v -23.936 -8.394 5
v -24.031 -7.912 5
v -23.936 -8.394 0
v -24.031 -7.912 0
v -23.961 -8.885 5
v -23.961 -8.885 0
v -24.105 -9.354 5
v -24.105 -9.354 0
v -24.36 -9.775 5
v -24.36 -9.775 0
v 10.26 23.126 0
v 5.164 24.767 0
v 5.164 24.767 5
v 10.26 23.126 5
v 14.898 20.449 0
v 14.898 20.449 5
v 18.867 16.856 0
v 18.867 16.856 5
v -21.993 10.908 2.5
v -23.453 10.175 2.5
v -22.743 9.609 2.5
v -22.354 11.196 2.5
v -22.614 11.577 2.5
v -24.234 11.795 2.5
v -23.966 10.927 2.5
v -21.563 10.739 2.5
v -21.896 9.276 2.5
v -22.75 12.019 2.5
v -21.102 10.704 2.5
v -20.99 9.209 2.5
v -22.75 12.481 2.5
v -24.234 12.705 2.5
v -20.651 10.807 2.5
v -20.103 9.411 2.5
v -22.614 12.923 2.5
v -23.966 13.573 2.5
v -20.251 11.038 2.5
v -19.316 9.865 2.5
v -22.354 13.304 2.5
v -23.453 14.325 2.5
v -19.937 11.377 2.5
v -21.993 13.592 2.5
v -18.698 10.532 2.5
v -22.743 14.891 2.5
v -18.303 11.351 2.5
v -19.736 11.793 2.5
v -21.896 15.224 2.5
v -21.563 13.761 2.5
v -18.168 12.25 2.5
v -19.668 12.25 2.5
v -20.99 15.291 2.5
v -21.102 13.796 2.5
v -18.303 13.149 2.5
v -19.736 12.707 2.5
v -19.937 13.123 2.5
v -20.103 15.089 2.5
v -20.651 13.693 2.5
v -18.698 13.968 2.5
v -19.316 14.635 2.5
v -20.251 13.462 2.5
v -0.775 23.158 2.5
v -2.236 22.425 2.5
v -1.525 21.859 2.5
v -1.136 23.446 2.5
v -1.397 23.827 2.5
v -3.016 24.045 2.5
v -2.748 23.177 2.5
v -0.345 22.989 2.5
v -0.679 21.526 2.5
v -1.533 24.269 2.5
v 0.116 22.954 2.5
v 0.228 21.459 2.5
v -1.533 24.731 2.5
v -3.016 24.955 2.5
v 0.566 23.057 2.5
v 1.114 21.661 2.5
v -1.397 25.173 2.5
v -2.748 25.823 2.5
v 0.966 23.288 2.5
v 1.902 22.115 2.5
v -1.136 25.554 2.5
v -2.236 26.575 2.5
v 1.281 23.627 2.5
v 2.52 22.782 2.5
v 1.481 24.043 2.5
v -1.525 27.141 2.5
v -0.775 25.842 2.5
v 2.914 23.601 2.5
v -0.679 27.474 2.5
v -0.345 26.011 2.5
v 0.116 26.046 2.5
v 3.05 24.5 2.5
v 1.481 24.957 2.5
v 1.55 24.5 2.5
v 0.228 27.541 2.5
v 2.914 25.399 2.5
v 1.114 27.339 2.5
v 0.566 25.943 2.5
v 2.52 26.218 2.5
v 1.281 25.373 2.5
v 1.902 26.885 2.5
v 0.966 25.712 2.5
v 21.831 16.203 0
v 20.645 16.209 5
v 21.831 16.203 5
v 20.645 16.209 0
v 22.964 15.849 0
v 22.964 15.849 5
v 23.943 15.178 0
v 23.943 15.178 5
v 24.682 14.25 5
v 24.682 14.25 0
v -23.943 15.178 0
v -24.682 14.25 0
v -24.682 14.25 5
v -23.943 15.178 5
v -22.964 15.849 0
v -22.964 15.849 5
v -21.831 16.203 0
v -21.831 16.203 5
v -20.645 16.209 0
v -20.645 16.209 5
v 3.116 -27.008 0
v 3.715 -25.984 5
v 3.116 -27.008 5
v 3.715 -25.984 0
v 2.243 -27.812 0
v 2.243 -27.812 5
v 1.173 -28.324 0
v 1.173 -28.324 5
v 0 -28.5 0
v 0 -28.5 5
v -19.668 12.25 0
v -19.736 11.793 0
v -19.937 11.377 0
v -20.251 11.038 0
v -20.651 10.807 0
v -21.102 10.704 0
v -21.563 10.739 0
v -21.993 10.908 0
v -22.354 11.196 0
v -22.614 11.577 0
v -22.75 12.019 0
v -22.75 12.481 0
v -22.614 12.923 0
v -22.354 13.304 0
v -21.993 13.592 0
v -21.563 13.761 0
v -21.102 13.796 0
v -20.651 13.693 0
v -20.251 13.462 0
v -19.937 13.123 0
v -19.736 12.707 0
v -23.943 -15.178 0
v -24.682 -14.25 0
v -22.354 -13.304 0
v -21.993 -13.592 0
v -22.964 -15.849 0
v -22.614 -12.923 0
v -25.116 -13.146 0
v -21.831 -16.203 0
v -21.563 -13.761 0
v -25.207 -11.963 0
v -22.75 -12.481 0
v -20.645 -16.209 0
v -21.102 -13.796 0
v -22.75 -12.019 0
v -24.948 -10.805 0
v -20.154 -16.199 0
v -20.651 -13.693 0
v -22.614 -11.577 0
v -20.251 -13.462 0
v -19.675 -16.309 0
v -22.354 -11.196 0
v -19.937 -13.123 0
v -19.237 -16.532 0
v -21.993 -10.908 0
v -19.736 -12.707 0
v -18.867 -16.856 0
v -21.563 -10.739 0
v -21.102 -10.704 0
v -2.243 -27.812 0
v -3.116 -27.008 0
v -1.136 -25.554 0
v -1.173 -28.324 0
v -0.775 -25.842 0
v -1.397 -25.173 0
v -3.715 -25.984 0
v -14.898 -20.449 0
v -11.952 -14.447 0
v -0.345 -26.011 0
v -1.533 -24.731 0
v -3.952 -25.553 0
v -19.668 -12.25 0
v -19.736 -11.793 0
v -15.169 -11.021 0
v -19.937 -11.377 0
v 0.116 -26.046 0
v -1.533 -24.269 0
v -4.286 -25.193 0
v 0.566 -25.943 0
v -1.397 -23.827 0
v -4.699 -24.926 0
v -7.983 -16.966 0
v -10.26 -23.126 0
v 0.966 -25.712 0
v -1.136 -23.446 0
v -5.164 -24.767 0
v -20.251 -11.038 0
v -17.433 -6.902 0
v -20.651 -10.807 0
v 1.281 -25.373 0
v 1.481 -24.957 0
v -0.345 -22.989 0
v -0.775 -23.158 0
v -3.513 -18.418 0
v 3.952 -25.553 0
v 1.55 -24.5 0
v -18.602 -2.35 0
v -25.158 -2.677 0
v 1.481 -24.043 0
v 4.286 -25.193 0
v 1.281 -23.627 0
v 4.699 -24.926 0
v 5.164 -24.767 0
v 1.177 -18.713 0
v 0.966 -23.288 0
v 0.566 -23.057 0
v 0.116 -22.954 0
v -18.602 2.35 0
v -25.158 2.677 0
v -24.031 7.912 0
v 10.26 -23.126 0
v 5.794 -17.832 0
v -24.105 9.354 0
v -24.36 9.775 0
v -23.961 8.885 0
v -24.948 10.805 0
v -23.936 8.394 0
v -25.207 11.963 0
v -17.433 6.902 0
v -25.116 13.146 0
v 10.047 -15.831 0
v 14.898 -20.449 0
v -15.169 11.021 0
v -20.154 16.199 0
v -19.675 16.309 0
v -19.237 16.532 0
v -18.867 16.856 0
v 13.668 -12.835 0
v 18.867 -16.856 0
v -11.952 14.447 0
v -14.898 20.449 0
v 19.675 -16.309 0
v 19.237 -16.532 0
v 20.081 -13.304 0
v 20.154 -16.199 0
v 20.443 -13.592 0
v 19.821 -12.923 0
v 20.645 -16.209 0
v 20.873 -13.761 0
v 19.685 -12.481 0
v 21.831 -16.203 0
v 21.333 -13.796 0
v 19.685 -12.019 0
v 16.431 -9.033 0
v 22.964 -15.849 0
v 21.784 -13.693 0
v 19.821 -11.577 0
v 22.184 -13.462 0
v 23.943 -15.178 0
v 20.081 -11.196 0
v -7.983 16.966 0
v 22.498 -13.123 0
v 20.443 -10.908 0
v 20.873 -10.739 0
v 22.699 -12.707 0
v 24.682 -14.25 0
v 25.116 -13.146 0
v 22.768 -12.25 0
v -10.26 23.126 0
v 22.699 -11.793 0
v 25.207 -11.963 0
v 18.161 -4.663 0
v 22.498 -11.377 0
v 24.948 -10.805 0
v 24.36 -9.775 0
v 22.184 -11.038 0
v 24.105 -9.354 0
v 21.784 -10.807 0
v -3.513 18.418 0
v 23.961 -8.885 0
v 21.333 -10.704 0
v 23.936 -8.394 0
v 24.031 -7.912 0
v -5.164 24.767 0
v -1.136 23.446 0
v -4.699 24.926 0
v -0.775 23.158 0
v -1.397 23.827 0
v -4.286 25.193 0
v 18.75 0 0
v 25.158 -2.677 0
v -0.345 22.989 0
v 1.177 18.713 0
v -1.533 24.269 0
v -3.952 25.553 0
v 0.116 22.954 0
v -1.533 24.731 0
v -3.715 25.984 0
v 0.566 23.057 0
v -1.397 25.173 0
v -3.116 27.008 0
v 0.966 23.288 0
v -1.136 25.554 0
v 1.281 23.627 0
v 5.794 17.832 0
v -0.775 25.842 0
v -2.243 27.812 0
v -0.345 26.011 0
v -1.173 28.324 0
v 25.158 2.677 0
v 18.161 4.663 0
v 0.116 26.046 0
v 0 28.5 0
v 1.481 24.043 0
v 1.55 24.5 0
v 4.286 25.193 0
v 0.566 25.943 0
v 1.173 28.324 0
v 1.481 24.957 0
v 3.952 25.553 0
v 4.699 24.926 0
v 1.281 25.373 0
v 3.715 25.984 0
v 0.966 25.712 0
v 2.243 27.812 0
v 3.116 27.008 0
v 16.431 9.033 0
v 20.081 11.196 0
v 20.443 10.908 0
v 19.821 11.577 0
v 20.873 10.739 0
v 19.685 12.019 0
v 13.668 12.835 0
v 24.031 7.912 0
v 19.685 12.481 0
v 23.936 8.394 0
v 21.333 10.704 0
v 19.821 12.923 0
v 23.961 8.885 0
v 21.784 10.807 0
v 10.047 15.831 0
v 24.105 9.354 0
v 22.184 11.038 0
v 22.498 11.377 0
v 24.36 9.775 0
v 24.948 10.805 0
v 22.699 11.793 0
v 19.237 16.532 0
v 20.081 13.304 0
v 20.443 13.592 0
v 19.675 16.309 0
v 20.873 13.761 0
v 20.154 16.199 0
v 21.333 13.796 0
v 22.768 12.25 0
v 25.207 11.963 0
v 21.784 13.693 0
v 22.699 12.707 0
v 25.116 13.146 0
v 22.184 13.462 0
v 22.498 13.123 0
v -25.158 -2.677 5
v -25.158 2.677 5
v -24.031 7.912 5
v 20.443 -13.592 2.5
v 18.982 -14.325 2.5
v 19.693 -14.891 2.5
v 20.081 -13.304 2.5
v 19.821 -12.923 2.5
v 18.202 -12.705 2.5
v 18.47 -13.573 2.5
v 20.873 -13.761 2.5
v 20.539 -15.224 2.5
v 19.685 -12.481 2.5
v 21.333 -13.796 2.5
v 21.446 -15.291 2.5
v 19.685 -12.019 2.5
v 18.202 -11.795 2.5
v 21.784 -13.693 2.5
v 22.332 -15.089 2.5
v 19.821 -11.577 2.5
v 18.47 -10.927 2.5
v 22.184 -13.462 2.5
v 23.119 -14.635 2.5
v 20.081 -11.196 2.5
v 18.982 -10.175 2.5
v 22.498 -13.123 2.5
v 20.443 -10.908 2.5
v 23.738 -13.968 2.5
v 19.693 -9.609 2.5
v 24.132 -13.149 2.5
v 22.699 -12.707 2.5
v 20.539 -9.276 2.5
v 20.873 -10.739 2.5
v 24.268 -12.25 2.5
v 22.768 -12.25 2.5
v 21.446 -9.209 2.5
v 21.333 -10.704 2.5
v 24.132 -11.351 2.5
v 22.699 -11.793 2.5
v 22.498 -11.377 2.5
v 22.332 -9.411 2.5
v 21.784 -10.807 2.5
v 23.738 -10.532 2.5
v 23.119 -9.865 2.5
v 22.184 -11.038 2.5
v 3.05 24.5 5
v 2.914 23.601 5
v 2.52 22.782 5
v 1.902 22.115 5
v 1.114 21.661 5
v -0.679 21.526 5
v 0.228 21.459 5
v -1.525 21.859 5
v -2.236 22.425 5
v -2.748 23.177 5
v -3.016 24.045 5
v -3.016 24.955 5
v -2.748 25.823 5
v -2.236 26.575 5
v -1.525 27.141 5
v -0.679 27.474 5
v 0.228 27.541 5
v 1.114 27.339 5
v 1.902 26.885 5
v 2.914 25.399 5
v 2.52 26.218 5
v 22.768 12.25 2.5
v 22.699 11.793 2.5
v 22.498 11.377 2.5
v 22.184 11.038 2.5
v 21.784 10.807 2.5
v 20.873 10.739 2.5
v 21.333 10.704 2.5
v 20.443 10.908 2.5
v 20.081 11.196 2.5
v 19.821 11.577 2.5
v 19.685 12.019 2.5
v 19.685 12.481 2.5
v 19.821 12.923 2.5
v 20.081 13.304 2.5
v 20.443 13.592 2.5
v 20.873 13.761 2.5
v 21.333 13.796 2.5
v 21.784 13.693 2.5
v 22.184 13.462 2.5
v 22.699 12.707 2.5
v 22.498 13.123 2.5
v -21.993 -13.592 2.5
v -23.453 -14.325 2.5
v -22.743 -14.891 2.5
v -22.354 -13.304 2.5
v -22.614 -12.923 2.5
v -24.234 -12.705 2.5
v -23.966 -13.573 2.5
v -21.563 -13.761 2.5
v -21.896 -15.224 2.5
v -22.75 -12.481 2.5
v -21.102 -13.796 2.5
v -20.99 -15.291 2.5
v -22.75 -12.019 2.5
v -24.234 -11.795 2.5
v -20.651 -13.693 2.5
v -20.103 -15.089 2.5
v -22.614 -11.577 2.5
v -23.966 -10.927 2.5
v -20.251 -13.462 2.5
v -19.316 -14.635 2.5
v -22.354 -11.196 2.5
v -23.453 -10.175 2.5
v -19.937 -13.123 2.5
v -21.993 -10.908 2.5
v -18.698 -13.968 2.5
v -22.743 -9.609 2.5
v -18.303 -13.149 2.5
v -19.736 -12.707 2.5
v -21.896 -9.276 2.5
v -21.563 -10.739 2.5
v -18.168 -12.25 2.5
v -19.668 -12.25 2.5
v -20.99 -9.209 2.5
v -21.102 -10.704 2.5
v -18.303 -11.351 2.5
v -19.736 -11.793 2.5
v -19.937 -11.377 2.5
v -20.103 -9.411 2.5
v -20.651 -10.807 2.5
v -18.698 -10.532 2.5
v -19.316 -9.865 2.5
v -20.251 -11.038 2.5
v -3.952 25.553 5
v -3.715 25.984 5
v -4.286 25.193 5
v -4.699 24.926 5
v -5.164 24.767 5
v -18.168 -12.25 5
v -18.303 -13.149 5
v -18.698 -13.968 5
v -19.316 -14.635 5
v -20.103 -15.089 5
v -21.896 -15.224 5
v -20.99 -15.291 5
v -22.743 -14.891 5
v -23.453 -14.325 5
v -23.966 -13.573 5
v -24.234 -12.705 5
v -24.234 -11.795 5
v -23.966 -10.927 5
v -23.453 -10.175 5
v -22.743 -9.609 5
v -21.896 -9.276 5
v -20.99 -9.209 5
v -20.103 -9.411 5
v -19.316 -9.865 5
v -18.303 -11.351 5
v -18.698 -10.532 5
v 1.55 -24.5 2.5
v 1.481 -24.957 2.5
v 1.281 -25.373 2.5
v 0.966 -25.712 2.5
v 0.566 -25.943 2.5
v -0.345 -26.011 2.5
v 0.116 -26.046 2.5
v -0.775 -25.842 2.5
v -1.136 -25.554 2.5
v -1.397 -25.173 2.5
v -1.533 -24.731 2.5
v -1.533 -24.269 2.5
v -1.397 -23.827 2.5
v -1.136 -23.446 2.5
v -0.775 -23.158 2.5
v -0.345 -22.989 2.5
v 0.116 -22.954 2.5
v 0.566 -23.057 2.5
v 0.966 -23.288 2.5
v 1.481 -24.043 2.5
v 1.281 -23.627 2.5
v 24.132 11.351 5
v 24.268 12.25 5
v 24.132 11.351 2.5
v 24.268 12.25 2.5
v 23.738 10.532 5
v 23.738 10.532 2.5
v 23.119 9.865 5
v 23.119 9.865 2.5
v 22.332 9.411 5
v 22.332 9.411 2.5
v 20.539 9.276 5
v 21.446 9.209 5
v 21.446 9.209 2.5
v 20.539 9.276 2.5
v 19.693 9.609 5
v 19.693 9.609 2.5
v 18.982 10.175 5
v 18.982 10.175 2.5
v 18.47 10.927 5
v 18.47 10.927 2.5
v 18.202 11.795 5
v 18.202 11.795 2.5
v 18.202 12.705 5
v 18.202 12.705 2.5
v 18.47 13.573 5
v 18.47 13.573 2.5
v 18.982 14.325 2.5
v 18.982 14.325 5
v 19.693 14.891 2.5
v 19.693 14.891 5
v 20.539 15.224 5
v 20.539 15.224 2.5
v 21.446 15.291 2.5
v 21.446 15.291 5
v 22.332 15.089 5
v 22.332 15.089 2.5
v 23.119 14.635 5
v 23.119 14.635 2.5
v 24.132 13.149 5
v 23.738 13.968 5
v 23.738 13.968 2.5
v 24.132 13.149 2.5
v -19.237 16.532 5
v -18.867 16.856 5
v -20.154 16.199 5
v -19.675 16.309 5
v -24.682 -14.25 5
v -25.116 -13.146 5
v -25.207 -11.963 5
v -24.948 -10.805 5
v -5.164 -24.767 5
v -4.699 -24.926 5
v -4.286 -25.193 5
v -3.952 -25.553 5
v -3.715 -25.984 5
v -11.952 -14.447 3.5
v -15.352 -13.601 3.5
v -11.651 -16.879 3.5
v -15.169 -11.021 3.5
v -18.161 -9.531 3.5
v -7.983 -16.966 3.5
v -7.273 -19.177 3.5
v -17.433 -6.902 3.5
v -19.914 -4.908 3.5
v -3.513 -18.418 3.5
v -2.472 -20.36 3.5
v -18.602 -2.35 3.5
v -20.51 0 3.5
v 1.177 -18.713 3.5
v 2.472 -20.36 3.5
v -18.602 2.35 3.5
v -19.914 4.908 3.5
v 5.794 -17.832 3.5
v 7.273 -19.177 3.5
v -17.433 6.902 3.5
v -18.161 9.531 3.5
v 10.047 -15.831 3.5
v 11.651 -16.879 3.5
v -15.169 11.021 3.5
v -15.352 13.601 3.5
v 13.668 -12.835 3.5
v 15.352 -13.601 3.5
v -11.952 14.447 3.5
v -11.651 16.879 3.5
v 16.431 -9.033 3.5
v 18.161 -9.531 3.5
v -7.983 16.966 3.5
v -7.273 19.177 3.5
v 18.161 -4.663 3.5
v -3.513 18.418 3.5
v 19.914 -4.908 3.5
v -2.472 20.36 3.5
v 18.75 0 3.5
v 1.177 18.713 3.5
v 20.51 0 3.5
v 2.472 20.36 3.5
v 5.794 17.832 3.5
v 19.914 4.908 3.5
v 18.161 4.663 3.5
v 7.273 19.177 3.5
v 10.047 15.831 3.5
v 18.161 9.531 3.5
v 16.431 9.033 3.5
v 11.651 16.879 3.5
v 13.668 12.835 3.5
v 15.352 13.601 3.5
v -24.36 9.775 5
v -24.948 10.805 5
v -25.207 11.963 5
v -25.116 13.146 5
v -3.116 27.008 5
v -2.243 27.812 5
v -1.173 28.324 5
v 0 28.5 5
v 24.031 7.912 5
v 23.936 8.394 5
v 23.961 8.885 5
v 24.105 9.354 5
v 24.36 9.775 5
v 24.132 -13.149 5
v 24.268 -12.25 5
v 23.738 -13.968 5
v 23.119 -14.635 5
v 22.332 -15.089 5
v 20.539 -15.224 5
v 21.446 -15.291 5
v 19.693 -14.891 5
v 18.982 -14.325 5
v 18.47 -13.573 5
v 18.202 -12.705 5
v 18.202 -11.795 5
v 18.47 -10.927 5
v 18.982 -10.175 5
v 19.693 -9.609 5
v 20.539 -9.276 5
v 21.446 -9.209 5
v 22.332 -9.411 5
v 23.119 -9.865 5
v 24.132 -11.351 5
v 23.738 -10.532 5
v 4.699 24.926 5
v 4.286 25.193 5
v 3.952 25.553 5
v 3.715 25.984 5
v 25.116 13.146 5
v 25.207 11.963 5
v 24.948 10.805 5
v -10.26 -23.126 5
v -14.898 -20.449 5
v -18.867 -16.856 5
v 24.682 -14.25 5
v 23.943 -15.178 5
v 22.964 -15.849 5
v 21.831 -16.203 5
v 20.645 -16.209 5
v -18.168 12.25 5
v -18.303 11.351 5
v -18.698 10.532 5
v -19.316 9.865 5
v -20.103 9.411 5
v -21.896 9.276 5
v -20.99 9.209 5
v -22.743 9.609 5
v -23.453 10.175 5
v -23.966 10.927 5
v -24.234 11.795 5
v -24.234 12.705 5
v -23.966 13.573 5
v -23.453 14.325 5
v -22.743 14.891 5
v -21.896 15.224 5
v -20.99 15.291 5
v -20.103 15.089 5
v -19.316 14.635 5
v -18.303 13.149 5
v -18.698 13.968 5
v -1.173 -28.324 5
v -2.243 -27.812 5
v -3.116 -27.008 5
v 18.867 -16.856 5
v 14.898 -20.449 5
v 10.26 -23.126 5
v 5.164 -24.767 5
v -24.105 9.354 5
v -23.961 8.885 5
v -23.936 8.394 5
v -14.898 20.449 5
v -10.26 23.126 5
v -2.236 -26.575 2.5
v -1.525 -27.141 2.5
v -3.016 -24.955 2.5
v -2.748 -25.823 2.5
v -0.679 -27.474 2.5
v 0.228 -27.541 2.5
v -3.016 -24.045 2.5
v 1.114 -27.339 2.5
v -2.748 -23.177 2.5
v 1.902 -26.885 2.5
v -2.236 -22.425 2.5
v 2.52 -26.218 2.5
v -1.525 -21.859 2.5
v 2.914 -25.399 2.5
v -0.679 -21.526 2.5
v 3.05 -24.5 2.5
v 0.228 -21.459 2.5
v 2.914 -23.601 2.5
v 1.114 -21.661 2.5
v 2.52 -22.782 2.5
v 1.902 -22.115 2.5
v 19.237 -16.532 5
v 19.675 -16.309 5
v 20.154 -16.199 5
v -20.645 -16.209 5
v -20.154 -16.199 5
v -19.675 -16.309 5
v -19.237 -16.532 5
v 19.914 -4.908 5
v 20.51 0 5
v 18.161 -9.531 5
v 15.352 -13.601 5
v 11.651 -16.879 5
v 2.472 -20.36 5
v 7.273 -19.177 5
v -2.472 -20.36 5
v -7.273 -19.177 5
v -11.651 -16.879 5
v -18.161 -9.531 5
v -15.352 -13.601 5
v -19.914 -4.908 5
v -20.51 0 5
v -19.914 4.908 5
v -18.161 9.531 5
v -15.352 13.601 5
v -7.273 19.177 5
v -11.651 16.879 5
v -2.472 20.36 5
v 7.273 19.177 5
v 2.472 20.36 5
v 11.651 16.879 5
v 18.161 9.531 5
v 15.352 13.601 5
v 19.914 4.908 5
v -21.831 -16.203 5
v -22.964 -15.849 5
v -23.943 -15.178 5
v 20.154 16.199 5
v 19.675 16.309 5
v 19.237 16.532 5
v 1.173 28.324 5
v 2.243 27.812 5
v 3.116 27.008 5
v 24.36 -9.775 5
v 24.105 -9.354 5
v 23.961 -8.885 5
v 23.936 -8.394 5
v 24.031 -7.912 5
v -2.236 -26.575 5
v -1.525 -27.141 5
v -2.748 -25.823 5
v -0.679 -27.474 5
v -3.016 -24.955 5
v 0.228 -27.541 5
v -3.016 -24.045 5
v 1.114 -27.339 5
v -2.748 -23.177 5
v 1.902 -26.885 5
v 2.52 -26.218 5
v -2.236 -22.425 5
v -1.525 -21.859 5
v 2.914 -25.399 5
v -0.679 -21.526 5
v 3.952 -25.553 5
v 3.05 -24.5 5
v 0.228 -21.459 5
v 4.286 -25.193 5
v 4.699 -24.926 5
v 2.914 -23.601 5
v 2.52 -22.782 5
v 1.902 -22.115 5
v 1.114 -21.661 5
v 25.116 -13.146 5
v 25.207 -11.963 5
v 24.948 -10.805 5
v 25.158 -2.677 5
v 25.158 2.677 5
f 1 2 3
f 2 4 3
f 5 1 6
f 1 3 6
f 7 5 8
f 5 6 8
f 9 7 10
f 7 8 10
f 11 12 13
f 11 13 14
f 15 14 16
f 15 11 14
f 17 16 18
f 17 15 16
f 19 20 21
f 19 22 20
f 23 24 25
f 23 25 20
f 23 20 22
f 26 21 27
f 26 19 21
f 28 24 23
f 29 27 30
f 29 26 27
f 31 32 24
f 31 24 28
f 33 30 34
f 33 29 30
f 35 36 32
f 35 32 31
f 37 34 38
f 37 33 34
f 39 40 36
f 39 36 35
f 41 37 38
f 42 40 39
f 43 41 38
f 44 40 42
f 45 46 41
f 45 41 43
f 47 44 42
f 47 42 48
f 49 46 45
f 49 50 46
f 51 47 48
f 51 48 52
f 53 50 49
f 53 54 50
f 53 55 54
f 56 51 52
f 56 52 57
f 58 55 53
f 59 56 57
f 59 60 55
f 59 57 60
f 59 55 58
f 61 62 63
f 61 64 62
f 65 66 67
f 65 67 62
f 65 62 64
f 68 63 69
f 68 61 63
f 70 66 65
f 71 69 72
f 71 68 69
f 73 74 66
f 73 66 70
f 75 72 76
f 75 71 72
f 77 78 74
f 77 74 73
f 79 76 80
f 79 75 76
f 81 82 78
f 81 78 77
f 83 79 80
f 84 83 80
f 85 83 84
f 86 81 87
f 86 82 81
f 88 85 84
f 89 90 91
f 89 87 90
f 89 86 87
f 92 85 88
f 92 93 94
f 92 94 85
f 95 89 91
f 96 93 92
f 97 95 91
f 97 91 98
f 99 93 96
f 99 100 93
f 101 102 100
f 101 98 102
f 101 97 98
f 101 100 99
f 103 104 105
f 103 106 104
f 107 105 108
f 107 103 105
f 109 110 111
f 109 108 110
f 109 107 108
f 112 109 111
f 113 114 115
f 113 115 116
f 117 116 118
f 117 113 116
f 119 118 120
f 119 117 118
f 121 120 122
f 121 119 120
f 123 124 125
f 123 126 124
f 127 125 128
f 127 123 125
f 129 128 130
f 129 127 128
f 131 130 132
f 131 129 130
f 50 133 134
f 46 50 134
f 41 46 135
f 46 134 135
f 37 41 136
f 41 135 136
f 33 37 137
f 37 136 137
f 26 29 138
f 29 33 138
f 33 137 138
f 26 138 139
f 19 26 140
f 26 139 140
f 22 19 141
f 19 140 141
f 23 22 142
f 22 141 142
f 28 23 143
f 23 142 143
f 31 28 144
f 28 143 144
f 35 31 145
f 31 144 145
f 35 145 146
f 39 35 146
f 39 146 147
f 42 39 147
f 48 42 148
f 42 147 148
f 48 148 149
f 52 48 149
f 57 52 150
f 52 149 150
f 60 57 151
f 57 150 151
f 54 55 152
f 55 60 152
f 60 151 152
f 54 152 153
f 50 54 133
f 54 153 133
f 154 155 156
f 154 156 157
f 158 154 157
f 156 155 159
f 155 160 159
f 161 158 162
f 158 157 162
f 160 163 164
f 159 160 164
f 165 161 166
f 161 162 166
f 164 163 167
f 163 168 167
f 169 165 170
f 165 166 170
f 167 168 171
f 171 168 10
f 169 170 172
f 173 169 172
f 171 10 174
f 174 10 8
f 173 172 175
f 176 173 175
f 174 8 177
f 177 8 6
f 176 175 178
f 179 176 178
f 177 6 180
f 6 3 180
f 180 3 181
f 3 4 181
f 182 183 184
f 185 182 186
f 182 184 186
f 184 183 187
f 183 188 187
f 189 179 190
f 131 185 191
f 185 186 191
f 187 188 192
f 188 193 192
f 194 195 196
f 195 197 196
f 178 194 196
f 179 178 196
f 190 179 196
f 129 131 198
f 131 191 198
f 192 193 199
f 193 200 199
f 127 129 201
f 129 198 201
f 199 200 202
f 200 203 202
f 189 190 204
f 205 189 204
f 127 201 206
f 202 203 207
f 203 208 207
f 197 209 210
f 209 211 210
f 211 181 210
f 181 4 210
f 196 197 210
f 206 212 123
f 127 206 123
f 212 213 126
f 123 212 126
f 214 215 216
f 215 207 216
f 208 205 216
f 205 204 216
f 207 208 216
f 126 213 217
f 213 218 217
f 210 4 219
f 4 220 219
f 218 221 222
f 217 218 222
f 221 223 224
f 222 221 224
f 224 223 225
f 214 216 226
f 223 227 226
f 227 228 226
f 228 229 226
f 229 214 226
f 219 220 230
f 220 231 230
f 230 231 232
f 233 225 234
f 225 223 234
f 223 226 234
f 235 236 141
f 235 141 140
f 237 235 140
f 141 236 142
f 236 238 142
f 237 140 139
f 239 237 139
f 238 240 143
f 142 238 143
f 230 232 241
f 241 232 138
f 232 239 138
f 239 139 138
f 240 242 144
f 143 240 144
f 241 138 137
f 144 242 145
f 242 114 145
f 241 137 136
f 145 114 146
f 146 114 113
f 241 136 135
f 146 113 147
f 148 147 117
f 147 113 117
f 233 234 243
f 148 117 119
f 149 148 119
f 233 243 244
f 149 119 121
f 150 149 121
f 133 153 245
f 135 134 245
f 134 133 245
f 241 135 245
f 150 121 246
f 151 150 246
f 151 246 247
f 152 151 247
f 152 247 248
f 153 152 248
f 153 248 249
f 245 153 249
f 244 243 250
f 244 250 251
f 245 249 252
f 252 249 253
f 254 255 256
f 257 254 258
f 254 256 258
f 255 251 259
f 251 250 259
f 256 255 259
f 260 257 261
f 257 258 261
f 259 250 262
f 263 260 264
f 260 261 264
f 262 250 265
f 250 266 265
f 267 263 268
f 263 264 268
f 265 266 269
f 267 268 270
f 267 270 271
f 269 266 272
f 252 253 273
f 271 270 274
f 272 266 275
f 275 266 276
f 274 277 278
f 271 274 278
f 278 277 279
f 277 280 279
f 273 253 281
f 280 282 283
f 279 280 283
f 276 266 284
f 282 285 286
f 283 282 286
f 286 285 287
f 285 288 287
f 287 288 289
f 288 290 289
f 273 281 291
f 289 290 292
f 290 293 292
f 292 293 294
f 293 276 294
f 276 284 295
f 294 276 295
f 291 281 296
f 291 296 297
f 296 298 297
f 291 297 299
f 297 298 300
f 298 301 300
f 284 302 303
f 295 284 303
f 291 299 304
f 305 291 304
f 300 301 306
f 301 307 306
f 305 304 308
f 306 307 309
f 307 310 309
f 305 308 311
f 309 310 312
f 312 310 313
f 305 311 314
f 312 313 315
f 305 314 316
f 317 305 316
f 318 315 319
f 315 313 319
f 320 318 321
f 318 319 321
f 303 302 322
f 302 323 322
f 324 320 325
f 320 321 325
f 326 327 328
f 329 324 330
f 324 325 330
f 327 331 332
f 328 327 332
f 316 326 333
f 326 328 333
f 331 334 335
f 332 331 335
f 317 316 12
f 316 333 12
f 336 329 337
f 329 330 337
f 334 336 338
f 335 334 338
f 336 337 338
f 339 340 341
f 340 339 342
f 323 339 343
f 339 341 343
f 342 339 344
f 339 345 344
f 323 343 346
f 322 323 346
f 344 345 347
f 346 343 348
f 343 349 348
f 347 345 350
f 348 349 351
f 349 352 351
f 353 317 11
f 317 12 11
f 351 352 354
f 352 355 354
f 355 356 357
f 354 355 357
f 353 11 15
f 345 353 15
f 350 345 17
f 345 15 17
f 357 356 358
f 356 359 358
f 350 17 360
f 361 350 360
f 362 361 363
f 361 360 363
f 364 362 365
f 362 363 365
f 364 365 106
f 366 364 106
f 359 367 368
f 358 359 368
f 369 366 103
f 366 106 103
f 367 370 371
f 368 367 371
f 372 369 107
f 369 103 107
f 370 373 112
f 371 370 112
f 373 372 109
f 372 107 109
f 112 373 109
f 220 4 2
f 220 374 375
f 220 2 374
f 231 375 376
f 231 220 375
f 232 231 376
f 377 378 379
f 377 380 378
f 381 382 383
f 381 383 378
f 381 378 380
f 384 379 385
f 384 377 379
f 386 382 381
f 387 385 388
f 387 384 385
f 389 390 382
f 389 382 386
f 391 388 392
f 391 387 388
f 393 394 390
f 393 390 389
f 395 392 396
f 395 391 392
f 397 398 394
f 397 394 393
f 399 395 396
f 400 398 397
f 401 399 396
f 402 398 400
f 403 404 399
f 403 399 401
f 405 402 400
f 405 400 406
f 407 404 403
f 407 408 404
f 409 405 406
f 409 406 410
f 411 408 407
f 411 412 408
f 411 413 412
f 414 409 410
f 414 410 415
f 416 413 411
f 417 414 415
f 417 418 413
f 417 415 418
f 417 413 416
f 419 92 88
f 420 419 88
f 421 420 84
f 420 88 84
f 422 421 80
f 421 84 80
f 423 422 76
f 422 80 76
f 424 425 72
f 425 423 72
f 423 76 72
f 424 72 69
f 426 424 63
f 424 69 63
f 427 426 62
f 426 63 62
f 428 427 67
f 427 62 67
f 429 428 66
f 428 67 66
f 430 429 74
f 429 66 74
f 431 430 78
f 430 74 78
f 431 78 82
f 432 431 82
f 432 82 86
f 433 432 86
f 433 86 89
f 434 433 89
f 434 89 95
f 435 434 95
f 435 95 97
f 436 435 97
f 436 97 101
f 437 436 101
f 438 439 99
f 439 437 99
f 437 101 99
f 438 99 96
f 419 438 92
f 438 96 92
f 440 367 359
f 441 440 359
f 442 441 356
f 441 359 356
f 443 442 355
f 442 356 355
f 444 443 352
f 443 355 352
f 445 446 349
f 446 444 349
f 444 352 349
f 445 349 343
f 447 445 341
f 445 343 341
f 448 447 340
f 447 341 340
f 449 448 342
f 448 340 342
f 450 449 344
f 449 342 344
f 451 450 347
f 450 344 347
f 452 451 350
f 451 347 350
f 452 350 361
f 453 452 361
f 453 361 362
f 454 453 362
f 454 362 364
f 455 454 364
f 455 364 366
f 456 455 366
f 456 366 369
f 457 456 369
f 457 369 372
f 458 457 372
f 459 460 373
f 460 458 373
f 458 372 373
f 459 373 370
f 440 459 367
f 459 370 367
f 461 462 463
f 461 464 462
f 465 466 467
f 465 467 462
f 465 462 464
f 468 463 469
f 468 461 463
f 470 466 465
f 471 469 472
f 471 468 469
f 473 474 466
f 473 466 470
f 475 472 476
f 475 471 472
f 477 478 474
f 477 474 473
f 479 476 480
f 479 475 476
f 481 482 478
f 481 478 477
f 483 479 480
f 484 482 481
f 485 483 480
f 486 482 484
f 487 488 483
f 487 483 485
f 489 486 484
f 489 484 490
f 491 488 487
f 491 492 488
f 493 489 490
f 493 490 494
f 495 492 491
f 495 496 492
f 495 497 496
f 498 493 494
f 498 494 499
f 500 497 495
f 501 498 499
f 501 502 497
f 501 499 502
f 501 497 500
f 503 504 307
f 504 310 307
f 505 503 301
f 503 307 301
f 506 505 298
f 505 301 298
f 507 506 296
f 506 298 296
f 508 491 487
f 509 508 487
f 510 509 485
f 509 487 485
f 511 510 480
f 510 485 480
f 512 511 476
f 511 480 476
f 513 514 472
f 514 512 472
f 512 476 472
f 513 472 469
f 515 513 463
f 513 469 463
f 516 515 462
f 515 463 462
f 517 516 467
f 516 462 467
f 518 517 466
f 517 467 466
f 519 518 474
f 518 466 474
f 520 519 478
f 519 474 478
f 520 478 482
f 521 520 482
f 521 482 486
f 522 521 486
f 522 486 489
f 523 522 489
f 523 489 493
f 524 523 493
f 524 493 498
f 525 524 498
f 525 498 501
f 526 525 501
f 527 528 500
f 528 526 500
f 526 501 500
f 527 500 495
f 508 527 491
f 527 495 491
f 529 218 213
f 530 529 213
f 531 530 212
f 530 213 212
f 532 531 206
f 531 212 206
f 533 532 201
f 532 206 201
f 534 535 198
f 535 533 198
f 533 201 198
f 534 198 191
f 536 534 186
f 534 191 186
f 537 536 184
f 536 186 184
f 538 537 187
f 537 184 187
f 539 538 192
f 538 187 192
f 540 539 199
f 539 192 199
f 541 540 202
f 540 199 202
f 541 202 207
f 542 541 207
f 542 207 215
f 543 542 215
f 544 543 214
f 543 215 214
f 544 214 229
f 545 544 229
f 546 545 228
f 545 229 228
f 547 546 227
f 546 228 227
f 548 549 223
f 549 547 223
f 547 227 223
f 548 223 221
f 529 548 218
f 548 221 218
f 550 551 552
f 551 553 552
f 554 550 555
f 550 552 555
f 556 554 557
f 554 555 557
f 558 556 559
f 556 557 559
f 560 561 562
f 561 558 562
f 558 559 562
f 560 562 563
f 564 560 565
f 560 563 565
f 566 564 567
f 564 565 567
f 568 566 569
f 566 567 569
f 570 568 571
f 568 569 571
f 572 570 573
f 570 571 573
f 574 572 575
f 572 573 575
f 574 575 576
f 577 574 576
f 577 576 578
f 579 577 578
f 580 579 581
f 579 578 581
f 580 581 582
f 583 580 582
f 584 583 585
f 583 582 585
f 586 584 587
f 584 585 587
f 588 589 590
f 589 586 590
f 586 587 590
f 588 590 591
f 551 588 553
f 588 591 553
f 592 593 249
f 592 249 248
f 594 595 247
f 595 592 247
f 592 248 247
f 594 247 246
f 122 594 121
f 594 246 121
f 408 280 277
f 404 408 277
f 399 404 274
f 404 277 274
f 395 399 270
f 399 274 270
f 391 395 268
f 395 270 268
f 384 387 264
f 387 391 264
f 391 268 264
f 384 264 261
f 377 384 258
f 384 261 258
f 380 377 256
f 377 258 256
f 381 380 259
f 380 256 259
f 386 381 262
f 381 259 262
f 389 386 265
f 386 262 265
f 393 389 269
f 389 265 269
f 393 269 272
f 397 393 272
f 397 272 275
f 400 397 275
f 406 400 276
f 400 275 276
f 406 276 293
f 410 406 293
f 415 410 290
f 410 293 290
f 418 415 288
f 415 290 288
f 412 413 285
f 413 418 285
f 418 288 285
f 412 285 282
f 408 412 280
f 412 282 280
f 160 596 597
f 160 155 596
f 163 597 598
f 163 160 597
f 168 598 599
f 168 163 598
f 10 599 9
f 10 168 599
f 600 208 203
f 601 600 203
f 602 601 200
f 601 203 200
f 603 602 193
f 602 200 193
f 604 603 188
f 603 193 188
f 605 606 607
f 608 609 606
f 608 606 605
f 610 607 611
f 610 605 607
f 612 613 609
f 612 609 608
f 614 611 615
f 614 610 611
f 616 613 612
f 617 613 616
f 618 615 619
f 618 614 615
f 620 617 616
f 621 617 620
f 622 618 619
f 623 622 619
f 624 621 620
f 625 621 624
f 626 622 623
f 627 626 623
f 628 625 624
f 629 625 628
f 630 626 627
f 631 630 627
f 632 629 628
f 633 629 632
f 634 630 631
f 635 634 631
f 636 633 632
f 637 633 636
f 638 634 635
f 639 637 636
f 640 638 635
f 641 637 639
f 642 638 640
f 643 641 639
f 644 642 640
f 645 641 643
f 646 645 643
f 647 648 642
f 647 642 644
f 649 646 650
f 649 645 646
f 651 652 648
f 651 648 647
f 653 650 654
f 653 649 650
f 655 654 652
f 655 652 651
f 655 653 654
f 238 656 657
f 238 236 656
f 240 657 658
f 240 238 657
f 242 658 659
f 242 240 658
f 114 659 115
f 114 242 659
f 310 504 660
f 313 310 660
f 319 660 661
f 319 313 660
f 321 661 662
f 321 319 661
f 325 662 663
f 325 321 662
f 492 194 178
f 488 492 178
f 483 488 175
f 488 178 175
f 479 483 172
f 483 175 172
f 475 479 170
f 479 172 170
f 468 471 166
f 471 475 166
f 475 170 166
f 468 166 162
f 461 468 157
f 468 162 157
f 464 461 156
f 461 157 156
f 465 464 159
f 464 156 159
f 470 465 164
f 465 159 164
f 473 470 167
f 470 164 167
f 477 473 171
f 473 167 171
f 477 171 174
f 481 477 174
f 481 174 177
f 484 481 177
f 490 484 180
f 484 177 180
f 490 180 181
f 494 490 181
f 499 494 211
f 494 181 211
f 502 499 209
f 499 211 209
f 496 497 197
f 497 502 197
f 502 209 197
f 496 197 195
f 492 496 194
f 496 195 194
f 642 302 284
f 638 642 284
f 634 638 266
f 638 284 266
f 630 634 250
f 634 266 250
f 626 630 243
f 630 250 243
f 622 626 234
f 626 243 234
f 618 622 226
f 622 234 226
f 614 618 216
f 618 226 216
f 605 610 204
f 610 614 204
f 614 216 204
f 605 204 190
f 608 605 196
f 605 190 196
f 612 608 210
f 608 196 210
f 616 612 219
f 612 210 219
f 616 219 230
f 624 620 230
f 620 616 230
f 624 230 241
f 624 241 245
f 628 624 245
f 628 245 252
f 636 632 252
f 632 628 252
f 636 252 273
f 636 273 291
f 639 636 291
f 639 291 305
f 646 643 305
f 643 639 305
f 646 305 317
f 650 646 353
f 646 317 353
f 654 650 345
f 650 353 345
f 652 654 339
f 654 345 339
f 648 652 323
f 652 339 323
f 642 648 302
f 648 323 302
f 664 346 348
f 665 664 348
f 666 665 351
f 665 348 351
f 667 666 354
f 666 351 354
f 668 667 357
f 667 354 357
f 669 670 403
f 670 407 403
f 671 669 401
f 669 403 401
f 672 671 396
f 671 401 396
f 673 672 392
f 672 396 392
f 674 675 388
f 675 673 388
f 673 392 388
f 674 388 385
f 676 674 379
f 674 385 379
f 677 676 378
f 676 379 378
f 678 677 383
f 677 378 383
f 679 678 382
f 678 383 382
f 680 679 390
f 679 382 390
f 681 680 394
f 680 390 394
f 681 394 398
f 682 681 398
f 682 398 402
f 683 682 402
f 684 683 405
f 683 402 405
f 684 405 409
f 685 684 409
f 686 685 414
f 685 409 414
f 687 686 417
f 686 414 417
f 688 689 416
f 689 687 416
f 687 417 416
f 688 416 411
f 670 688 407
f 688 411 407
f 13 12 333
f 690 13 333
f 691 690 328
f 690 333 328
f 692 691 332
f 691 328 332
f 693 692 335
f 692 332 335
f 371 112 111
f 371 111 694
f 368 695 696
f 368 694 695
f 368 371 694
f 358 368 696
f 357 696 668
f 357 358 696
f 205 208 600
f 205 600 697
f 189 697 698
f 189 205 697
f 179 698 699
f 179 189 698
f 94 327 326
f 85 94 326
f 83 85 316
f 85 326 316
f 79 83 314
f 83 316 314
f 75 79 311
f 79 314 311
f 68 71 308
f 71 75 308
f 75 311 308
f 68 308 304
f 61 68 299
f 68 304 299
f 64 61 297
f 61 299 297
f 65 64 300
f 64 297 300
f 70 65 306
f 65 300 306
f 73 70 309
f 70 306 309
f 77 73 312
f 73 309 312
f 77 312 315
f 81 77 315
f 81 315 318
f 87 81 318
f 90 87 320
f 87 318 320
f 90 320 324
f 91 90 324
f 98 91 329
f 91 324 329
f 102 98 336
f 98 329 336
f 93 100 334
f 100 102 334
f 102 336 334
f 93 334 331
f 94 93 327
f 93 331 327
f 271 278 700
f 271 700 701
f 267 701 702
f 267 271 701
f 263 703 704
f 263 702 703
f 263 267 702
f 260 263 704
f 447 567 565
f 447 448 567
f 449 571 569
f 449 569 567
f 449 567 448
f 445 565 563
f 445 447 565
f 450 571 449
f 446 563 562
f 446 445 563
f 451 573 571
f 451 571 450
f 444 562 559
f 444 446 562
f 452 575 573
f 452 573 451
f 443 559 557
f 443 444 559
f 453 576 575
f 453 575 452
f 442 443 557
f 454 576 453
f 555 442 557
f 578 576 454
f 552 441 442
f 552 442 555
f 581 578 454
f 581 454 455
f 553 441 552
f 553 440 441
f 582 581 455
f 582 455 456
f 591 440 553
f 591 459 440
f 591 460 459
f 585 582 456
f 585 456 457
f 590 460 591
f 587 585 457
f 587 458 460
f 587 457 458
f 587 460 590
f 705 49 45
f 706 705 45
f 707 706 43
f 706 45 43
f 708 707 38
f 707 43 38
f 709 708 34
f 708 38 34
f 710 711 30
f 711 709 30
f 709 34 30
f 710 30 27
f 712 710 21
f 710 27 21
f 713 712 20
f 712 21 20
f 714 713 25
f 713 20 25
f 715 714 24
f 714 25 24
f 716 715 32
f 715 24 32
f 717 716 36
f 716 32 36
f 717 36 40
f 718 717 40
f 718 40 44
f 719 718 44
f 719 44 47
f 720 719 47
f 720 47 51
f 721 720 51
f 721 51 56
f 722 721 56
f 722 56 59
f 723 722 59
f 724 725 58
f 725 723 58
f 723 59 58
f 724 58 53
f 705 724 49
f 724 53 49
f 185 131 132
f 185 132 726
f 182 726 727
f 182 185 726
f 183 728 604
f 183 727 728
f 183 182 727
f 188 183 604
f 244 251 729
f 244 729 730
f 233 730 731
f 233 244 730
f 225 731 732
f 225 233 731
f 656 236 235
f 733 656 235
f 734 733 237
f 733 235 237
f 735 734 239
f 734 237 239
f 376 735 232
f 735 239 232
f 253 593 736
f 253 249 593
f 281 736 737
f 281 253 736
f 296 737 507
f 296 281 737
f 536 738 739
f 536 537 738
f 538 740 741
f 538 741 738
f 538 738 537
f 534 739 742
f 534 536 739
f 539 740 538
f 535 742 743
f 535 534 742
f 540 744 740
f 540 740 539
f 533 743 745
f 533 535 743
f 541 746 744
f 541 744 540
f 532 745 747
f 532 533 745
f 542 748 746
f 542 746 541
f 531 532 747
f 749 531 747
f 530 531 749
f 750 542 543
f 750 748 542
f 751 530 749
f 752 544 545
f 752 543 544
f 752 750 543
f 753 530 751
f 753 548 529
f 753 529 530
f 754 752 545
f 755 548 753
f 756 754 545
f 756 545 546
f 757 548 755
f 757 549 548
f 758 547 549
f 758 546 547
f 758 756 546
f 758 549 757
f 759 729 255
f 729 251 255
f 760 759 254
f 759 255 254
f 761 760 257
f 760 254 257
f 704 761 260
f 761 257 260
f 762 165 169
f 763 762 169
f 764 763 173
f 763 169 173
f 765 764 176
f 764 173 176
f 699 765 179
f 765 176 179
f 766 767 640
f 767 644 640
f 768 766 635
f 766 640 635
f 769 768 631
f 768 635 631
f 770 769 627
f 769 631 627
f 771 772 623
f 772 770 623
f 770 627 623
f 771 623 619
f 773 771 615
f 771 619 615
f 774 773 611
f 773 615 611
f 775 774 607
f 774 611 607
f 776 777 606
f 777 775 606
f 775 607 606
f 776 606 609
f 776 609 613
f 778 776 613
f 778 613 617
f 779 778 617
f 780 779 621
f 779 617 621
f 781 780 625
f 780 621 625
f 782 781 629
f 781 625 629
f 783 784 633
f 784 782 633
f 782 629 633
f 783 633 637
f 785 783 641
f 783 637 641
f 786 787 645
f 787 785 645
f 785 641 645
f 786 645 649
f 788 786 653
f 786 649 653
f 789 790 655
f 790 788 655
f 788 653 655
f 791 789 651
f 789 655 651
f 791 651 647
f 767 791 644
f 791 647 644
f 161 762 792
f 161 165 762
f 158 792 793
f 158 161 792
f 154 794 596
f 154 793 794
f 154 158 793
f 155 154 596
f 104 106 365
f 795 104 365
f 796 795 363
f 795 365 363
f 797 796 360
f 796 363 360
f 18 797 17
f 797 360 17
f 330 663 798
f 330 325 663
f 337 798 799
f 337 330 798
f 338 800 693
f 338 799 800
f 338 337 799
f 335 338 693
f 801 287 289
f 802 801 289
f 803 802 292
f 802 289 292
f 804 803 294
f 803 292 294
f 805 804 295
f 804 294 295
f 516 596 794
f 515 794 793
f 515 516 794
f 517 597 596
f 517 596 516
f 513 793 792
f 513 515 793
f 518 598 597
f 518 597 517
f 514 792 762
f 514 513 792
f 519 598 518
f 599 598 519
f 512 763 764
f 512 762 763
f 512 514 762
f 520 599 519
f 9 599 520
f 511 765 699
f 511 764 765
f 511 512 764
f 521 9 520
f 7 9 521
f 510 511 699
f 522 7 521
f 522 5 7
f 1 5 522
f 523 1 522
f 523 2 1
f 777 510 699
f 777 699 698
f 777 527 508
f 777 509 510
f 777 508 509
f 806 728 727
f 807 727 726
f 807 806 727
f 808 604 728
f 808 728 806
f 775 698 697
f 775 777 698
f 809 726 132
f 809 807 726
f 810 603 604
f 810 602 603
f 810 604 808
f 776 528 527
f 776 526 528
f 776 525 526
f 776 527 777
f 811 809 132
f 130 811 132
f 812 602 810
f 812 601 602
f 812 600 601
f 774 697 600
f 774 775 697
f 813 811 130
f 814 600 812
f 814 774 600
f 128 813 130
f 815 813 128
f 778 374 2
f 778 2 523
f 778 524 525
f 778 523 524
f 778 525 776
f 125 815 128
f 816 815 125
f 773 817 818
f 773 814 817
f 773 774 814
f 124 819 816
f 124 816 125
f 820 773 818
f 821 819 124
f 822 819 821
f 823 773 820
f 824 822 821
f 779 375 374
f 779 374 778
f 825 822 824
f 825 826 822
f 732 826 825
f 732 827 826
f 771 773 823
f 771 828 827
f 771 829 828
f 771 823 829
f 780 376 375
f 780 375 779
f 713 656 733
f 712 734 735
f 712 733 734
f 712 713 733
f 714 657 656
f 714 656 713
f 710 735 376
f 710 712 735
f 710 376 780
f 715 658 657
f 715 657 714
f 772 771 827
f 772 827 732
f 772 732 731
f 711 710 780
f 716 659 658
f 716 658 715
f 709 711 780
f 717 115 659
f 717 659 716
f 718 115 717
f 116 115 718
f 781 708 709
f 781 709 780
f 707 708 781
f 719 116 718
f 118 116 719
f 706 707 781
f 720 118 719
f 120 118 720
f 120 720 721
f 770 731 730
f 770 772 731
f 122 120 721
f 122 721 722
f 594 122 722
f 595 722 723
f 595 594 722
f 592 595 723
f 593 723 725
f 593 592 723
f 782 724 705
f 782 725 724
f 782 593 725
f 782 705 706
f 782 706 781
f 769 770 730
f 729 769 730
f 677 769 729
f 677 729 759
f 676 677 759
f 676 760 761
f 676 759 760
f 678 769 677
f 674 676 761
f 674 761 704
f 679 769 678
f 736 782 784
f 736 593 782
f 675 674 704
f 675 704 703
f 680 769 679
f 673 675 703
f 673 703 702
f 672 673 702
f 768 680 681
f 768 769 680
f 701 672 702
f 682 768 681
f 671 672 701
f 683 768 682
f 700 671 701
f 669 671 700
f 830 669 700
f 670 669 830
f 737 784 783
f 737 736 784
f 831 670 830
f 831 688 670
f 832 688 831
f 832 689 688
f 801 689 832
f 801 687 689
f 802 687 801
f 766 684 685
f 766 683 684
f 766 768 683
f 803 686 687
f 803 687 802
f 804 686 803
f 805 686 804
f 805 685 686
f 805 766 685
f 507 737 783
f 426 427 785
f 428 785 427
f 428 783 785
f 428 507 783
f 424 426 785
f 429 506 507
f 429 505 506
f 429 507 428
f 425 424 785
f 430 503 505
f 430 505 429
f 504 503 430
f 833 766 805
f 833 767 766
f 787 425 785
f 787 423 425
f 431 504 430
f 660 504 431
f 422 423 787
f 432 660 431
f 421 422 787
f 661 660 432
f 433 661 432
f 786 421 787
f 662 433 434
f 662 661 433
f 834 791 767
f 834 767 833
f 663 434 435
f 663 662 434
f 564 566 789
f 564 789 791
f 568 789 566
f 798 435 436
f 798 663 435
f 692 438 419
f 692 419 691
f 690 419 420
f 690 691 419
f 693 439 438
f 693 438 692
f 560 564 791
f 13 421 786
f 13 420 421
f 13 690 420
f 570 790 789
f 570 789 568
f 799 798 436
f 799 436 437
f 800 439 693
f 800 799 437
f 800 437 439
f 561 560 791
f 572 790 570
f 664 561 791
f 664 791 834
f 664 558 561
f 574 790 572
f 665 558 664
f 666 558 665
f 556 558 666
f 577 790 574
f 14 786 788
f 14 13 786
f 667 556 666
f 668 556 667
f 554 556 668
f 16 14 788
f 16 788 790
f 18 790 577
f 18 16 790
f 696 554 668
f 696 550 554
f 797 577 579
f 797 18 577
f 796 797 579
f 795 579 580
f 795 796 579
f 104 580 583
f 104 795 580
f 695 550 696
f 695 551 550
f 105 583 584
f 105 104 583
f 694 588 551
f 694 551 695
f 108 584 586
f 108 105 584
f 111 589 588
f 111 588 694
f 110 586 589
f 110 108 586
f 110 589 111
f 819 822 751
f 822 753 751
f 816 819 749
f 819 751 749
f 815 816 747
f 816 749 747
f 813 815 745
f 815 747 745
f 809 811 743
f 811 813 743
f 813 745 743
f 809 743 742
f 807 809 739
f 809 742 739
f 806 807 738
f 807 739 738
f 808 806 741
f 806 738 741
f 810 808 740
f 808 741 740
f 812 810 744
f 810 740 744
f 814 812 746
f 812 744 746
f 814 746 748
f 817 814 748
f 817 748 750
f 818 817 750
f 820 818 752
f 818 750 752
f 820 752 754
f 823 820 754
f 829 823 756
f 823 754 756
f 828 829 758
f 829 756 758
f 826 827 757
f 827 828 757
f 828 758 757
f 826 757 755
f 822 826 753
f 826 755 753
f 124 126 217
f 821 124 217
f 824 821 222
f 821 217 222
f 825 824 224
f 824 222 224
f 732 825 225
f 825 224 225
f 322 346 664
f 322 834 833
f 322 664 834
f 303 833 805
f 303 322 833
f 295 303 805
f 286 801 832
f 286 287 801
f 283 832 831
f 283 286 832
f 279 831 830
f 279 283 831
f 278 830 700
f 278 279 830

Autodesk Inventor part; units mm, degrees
ref_plane "YZ Plane" through (0, 0, 0) normal (1, 0, 0) x (0, 1, 0)
ref_plane "XZ Plane" through (0, 0, 0) normal (0, 1, 0) x (-1, 0, 0)
ref_plane "XY Plane" through (0, 0, 0) normal (0, 0, 1) x (1, 0, 0)
sketch "スケッチ1" plane through (0, 0, 0) normal (0, 0, 1) x (1, 0, 0)
  circle A0 centre (0, 0) radius 18.75
  circle A1 centre (0, 0) radius 20.5 construction
  circle A2 centre (0, 0) radius 20.51
  line L0 (0, 0) -> (0, 24.5) construction
  circle A3 centre (0, 24.5) radius 1.55
  circle A4 centre (0, 24.5) radius 3 construction
  arc A5 (0, 28.5) -> (-3.7147, 25.9835) centre (0, 24.5) ccw
  arc A6 (-5.1639, 24.7674) -> (-18.8673, 16.8557) centre (0, 0) ccw
  arc A7 (-5.1639, 24.7674) -> (-3.7147, 25.9835) centre (-5.5721, 26.7253) ccw
  arc A8 (3.7147, 25.9835) -> (0, 28.5) centre (0, 24.5) ccw
  arc A9 (3.7147, 25.9835) -> (5.1639, 24.7674) centre (5.5721, 26.7253) ccw
  circle A10 centre (0, 24.5) radius 3.05
  arc A11 (-24.0311, 7.9117) -> (-24.0311, -7.9117) centre (0, 0) ccw
  arc A12 (-24.0311, 7.9117) -> (-24.3598, 9.7747) centre (-25.9308, 8.5371) ccw
  arc A13 (-24.6817, 14.25) -> (-24.3598, 9.7747) centre (-21.2176, 12.25) ccw
  arc A14 (-20.645, 16.2088) -> (-24.6817, 14.25) centre (-21.2176, 12.25) ccw
  arc A15 (-20.645, 16.2088) -> (-18.8673, 16.8557) centre (-20.3588, 18.1882) ccw
  circle A16 centre (-21.2176, 12.25) radius 3.05
  circle A17 centre (-21.2176, 12.25) radius 1.55
  arc A18 (-18.8673, -16.8557) -> (-5.1639, -24.7674) centre (0, 0) ccw
  arc A19 (-18.8673, -16.8557) -> (-20.645, -16.2088) centre (-20.3588, -18.1882) ccw
  arc A20 (-24.6817, -14.25) -> (-20.645, -16.2088) centre (-21.2176, -12.25) ccw
  arc A21 (-24.3598, -9.7747) -> (-24.6817, -14.25) centre (-21.2176, -12.25) ccw
  arc A22 (-24.3598, -9.7747) -> (-24.0311, -7.9117) centre (-25.9308, -8.5371) ccw
  circle A23 centre (-21.2176, -12.25) radius 3.05
  circle A24 centre (-21.2176, -12.25) radius 1.55
  arc A25 (5.1639, -24.7674) -> (18.8673, -16.8557) centre (0, 0) ccw
  arc A26 (5.1639, -24.7674) -> (3.7147, -25.9835) centre (5.5721, -26.7253) ccw
  arc A27 (0, -28.5) -> (3.7147, -25.9835) centre (0, -24.5) ccw
  arc A28 (-3.7147, -25.9835) -> (0, -28.5) centre (0, -24.5) ccw
  arc A29 (-3.7147, -25.9835) -> (-5.1639, -24.7674) centre (-5.5721, -26.7253) ccw
  circle A30 centre (0, -24.5) radius 3.05
  circle A31 centre (0, -24.5) radius 1.55
  arc A32 (24.0311, -7.9117) -> (24.0311, 7.9117) centre (0, 0) ccw
  arc A33 (24.0311, -7.9117) -> (24.3598, -9.7747) centre (25.9308, -8.5371) ccw
  arc A34 (24.6817, -14.25) -> (24.3598, -9.7747) centre (21.2176, -12.25) ccw
  arc A35 (20.645, -16.2088) -> (24.6817, -14.25) centre (21.2176, -12.25) ccw
  arc A36 (20.645, -16.2088) -> (18.8673, -16.8557) centre (20.3588, -18.1882) ccw
  circle A37 centre (21.2176, -12.25) radius 3.05
  circle A38 centre (21.2176, -12.25) radius 1.55
  arc A39 (18.8673, 16.8557) -> (5.1639, 24.7674) centre (0, 0) ccw
  arc A40 (18.8673, 16.8557) -> (20.645, 16.2088) centre (20.3588, 18.1882) ccw
  arc A41 (24.6817, 14.25) -> (20.645, 16.2088) centre (21.2176, 12.25) ccw
  arc A42 (24.3598, 9.7747) -> (24.6817, 14.25) centre (21.2176, 12.25) ccw
  arc A43 (24.3598, 9.7747) -> (24.0311, 7.9117) centre (25.9308, 8.5371) ccw
  circle A44 centre (21.2176, 12.25) radius 3.05
  circle A45 centre (21.2176, 12.25) radius 1.55
  point P0 (-18.8673, 16.8557)
  point P1 (-24.0311, -7.9117)
  point P2 (-5.1639, -24.7674)
  point P3 (18.8673, -16.8557)
  point P4 (24.0311, 7.9117)
  dimension "d0" = 37.5
  dimension "d1" = 41
  dimension "d2" = 24.5
  dimension "d3" = 0.01
  dimension "d4" = 3.1
  dimension "d5" = 6
  dimension "d8" = 2
  dimension "d9" = 4.8
  dimension "d10" = 4
  dimension "d11" = 0.05
  dimension "d14" = 360
extrude "押し出し1" add sketch "スケッチ1" along normal blind 5 contours A8 A9 A39 A40 A41 A42 A43 A32 A33 A34 A35 A36 A25 A26 A27 A28 A29 A18 A19 A20 A21 A22 A11 A12 A13 A14 A15 A6 A7 A5
extrude "押し出し2" add sketch "スケッチ1" along normal blind 3.5 contours A2
extrude "押し出し3" add sketch "スケッチ1" along normal blind 2.5 contours A10 | A16 | A23 | A30 | A37 | A44
properties part number "Outer_support_stand" material "アルミニウム 2014-T4"
